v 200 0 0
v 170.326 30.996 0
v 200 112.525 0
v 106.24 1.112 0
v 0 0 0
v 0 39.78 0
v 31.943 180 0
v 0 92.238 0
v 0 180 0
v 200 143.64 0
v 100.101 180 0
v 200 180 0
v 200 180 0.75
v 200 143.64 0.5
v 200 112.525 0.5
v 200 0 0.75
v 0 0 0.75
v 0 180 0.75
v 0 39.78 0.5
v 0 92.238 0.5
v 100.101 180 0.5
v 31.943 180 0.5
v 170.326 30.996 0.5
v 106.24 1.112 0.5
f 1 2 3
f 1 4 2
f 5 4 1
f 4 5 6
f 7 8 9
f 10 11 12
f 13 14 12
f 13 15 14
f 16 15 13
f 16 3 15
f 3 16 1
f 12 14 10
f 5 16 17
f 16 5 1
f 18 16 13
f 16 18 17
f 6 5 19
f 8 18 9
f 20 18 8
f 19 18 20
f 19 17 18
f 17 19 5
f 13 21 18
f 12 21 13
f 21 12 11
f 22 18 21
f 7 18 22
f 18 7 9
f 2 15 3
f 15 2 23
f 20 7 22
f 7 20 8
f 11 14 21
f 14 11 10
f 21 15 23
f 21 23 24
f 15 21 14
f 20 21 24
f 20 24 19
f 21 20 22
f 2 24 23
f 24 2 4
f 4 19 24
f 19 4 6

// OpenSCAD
module wciecie() {
    mh = 166;
    mw = 181;
    cutout = 50;
    polygon([[0,0], [0,mh-cutout], [cutout, mh],  [mw,mh], [mw,0]]);
}

module powierzchnia() {
    mh = 180;
    mw = 200;
    sh = 0;
    sw = 0;
    polygon([[sw,sh], [sw,mh], [mw, mh], [mw,sh]]);
}

    //linear_extrude(height = 2, scale = 1)
    //    scale([1.05, 1.05, 1])
    //        wciecie();

difference() {
    linear_extrude(height = 0.75, scale = 1)
        powierzchnia();
    
    translate([210,140,-5])
        rotate(90+45+25)
        linear_extrude(height = 5.5, scale = 1)
            wciecie();
}
